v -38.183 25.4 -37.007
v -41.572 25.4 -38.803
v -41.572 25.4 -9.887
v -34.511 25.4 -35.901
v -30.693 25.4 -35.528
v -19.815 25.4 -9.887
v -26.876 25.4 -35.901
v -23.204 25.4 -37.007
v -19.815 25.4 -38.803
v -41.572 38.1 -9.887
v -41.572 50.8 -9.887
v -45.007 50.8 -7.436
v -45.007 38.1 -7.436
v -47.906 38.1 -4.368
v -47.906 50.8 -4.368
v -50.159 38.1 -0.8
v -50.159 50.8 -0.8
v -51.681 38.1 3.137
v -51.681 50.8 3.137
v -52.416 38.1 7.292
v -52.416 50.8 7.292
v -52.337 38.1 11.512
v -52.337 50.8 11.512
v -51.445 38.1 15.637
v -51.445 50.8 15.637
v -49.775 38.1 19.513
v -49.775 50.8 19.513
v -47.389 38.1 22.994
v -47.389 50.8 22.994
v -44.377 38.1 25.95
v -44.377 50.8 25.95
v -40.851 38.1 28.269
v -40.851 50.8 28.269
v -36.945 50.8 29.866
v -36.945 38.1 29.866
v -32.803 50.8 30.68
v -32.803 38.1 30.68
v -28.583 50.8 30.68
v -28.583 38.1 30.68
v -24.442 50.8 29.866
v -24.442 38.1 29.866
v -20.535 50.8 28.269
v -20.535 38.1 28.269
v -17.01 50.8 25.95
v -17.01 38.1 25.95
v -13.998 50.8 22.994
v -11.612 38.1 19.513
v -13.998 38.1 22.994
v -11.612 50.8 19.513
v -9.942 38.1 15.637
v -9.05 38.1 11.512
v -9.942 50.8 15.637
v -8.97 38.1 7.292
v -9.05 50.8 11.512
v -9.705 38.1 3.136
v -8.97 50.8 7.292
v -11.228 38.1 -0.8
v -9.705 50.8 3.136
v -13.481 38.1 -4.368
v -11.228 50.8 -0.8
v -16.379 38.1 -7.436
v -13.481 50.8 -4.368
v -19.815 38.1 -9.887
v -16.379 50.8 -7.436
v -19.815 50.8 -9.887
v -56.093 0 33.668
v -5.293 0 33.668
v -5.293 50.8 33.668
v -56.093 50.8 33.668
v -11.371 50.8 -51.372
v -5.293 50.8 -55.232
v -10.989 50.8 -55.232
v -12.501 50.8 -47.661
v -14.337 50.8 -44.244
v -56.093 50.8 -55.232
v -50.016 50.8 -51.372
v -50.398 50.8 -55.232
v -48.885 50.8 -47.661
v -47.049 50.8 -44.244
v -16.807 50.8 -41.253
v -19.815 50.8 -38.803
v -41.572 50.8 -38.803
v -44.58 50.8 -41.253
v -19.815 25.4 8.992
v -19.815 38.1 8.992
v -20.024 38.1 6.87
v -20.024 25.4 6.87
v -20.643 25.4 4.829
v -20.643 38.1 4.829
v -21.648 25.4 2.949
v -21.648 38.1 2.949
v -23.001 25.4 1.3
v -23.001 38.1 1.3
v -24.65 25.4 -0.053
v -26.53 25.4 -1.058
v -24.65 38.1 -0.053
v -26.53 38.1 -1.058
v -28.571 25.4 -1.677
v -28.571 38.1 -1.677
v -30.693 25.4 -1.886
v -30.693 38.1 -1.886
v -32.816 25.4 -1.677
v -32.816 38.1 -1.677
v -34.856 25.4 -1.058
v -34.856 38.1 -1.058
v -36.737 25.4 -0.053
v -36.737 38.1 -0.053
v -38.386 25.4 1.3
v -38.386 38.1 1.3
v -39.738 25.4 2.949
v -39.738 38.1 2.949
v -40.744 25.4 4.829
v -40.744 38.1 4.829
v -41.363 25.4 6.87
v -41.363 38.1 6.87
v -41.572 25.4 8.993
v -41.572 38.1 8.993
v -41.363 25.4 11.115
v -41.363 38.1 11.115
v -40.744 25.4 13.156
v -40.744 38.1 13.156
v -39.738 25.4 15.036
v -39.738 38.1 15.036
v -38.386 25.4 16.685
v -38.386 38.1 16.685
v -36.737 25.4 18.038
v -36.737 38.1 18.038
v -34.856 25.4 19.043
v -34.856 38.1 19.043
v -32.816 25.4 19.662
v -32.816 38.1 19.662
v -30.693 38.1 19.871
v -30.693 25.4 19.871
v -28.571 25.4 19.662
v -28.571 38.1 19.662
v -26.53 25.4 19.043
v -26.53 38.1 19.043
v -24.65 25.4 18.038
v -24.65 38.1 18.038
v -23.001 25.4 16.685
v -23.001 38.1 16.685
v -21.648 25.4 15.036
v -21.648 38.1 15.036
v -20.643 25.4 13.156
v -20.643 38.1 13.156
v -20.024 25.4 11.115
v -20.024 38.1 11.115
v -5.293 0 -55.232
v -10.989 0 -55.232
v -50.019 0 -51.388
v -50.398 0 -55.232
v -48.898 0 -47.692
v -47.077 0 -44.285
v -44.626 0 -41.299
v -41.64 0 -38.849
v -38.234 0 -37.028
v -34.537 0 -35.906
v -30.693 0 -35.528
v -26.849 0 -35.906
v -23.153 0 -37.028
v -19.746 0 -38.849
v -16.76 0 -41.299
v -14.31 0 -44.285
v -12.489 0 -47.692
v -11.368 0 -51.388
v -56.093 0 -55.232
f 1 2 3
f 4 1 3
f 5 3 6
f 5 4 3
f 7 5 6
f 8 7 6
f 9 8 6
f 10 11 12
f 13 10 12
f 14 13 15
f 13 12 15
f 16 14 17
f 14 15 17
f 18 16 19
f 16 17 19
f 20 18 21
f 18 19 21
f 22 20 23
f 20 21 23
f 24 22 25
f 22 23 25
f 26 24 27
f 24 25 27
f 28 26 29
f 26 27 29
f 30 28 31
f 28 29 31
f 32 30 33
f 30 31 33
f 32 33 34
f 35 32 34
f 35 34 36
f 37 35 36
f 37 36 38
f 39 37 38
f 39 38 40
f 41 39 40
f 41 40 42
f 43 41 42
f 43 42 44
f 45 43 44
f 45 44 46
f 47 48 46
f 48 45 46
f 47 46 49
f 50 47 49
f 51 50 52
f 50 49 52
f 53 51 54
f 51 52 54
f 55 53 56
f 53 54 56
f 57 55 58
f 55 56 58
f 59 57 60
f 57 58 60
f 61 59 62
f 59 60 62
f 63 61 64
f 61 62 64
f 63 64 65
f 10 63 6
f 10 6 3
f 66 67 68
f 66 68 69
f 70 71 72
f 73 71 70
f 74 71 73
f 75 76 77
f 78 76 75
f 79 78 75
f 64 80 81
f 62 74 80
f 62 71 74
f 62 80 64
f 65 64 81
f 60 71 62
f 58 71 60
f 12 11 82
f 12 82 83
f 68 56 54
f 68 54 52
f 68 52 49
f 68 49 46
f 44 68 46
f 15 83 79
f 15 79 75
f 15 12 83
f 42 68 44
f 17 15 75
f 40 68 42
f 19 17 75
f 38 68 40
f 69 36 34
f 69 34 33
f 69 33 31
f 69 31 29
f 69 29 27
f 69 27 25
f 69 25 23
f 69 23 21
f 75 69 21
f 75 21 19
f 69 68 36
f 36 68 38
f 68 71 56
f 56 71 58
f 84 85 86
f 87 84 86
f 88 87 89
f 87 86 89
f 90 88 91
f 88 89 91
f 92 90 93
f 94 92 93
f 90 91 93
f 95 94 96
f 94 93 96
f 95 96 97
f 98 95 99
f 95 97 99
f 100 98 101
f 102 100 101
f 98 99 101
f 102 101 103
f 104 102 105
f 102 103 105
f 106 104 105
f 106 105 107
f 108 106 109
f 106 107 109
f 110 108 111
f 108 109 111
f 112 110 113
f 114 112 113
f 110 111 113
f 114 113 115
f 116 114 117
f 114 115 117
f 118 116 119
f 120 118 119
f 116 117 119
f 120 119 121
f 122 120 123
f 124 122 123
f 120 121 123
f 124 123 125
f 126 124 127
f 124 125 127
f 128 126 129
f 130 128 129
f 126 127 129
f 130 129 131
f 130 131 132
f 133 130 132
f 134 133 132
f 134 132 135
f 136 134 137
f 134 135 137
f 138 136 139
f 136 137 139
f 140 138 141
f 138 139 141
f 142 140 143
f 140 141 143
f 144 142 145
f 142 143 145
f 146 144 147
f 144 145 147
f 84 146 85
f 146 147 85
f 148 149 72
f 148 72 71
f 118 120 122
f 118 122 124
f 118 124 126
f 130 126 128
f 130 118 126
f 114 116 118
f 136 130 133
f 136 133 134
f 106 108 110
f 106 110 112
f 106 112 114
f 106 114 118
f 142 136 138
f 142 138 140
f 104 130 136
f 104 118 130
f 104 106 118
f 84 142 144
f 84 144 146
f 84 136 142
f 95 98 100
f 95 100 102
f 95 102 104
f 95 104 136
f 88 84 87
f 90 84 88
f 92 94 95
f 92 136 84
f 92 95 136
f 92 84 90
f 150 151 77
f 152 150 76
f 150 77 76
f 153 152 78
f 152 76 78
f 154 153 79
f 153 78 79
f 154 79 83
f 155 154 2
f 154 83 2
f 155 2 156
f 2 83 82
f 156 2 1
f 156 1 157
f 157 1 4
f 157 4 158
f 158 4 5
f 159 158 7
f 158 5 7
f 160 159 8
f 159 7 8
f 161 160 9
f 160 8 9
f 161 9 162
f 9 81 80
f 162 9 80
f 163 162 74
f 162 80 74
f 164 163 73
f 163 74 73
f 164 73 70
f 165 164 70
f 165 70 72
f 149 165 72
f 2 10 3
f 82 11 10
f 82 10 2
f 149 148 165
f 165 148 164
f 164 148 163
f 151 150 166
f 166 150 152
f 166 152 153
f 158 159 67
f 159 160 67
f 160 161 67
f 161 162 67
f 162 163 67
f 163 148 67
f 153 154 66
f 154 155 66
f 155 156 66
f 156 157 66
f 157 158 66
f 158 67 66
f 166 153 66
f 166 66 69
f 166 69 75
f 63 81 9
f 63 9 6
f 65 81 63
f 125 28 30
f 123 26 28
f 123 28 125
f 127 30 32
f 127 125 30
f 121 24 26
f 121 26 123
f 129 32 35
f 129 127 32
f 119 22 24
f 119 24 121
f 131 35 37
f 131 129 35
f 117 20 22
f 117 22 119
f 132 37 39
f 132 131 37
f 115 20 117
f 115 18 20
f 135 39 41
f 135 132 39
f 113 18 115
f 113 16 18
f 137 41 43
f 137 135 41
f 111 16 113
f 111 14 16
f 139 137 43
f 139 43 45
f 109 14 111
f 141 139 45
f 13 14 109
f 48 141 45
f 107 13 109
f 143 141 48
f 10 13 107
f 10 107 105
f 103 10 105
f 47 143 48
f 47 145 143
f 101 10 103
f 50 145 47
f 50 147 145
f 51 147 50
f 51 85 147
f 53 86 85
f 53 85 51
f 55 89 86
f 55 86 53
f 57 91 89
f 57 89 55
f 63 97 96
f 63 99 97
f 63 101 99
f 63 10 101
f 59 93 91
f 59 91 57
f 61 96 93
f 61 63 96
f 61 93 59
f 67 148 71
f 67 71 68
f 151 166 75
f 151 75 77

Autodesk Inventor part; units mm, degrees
ref_plane "YZ Plane" through (0, 0, 0) normal (1, 0, 0) x (0, 1, 0)
ref_plane "XZ Plane" through (0, 0, 0) normal (0, 1, 0) x (-1, 0, 0)
ref_plane "XY Plane" through (0, 0, 0) normal (0, 0, 1) x (1, 0, 0)
sketch "Sketch1" plane through (0, 0, 0) normal (0, 1, 0) x (-1, 0, 0)
  line L0 (5.2933, 33.6678) -> (56.0933, 33.6678)
  line L1 (56.0933, 33.6678) -> (56.0933, -55.2322)
  line L2 (56.0933, -55.2322) -> (5.2933, -55.2322)
  line L3 (5.2933, -55.2322) -> (5.2933, 33.6678)
  point P0 (0, 0)
  dimension "d0" = 50.8
  dimension "d1" = 88.9
extrude "Extrusion1" add sketch "Sketch1" along normal blind 50.8
sketch "Sketch2" plane through (0, 50.8, 0) normal (0, 1, 0) x (1, 0, 0)
  circle A0 centre (-30.6933, -8.9925) radius 21.7895
  circle A1 centre (-30.6933, -8.9925) radius 10.8785
  line L0 (-5.2933, 55.2322) -> (-56.0933, 55.2322) projected
  line L1 (-19.8148, 9.8871) -> (-41.5719, 9.8871)
  line L2 (-41.5719, 9.8871) -> (-41.5719, 55.2322)
  line L3 (-41.5719, 55.2322) -> (-19.8148, 55.2322)
  line L4 (-19.8148, 55.2322) -> (-19.8148, 9.8871)
  circle A2 centre (-30.6933, 55.2322) radius 19.7044
  point P0 (0, 0)
extrude "Extrusion2" cut sketch "Sketch2" against normal up to next contours A2 L2 L0 L4 | L4 L0 A2 | A2 L0 L2 | L0 A2
extrude "Extrusion3" cut sketch "Sketch2" against normal blind 12.7 contours A0 L1 | L1 A0
extrude "Extrusion4" cut sketch "Sketch2" against normal blind 25.4 contours A1
extrude "Extrusion5" cut sketch "Sketch2" against normal blind 25.4 contours L1 A0 | A0 L2 A2 L4 | A2 L2 L0 L4 picked at (-29.9354, 10.8174)
properties part number "7.2 part 2"
